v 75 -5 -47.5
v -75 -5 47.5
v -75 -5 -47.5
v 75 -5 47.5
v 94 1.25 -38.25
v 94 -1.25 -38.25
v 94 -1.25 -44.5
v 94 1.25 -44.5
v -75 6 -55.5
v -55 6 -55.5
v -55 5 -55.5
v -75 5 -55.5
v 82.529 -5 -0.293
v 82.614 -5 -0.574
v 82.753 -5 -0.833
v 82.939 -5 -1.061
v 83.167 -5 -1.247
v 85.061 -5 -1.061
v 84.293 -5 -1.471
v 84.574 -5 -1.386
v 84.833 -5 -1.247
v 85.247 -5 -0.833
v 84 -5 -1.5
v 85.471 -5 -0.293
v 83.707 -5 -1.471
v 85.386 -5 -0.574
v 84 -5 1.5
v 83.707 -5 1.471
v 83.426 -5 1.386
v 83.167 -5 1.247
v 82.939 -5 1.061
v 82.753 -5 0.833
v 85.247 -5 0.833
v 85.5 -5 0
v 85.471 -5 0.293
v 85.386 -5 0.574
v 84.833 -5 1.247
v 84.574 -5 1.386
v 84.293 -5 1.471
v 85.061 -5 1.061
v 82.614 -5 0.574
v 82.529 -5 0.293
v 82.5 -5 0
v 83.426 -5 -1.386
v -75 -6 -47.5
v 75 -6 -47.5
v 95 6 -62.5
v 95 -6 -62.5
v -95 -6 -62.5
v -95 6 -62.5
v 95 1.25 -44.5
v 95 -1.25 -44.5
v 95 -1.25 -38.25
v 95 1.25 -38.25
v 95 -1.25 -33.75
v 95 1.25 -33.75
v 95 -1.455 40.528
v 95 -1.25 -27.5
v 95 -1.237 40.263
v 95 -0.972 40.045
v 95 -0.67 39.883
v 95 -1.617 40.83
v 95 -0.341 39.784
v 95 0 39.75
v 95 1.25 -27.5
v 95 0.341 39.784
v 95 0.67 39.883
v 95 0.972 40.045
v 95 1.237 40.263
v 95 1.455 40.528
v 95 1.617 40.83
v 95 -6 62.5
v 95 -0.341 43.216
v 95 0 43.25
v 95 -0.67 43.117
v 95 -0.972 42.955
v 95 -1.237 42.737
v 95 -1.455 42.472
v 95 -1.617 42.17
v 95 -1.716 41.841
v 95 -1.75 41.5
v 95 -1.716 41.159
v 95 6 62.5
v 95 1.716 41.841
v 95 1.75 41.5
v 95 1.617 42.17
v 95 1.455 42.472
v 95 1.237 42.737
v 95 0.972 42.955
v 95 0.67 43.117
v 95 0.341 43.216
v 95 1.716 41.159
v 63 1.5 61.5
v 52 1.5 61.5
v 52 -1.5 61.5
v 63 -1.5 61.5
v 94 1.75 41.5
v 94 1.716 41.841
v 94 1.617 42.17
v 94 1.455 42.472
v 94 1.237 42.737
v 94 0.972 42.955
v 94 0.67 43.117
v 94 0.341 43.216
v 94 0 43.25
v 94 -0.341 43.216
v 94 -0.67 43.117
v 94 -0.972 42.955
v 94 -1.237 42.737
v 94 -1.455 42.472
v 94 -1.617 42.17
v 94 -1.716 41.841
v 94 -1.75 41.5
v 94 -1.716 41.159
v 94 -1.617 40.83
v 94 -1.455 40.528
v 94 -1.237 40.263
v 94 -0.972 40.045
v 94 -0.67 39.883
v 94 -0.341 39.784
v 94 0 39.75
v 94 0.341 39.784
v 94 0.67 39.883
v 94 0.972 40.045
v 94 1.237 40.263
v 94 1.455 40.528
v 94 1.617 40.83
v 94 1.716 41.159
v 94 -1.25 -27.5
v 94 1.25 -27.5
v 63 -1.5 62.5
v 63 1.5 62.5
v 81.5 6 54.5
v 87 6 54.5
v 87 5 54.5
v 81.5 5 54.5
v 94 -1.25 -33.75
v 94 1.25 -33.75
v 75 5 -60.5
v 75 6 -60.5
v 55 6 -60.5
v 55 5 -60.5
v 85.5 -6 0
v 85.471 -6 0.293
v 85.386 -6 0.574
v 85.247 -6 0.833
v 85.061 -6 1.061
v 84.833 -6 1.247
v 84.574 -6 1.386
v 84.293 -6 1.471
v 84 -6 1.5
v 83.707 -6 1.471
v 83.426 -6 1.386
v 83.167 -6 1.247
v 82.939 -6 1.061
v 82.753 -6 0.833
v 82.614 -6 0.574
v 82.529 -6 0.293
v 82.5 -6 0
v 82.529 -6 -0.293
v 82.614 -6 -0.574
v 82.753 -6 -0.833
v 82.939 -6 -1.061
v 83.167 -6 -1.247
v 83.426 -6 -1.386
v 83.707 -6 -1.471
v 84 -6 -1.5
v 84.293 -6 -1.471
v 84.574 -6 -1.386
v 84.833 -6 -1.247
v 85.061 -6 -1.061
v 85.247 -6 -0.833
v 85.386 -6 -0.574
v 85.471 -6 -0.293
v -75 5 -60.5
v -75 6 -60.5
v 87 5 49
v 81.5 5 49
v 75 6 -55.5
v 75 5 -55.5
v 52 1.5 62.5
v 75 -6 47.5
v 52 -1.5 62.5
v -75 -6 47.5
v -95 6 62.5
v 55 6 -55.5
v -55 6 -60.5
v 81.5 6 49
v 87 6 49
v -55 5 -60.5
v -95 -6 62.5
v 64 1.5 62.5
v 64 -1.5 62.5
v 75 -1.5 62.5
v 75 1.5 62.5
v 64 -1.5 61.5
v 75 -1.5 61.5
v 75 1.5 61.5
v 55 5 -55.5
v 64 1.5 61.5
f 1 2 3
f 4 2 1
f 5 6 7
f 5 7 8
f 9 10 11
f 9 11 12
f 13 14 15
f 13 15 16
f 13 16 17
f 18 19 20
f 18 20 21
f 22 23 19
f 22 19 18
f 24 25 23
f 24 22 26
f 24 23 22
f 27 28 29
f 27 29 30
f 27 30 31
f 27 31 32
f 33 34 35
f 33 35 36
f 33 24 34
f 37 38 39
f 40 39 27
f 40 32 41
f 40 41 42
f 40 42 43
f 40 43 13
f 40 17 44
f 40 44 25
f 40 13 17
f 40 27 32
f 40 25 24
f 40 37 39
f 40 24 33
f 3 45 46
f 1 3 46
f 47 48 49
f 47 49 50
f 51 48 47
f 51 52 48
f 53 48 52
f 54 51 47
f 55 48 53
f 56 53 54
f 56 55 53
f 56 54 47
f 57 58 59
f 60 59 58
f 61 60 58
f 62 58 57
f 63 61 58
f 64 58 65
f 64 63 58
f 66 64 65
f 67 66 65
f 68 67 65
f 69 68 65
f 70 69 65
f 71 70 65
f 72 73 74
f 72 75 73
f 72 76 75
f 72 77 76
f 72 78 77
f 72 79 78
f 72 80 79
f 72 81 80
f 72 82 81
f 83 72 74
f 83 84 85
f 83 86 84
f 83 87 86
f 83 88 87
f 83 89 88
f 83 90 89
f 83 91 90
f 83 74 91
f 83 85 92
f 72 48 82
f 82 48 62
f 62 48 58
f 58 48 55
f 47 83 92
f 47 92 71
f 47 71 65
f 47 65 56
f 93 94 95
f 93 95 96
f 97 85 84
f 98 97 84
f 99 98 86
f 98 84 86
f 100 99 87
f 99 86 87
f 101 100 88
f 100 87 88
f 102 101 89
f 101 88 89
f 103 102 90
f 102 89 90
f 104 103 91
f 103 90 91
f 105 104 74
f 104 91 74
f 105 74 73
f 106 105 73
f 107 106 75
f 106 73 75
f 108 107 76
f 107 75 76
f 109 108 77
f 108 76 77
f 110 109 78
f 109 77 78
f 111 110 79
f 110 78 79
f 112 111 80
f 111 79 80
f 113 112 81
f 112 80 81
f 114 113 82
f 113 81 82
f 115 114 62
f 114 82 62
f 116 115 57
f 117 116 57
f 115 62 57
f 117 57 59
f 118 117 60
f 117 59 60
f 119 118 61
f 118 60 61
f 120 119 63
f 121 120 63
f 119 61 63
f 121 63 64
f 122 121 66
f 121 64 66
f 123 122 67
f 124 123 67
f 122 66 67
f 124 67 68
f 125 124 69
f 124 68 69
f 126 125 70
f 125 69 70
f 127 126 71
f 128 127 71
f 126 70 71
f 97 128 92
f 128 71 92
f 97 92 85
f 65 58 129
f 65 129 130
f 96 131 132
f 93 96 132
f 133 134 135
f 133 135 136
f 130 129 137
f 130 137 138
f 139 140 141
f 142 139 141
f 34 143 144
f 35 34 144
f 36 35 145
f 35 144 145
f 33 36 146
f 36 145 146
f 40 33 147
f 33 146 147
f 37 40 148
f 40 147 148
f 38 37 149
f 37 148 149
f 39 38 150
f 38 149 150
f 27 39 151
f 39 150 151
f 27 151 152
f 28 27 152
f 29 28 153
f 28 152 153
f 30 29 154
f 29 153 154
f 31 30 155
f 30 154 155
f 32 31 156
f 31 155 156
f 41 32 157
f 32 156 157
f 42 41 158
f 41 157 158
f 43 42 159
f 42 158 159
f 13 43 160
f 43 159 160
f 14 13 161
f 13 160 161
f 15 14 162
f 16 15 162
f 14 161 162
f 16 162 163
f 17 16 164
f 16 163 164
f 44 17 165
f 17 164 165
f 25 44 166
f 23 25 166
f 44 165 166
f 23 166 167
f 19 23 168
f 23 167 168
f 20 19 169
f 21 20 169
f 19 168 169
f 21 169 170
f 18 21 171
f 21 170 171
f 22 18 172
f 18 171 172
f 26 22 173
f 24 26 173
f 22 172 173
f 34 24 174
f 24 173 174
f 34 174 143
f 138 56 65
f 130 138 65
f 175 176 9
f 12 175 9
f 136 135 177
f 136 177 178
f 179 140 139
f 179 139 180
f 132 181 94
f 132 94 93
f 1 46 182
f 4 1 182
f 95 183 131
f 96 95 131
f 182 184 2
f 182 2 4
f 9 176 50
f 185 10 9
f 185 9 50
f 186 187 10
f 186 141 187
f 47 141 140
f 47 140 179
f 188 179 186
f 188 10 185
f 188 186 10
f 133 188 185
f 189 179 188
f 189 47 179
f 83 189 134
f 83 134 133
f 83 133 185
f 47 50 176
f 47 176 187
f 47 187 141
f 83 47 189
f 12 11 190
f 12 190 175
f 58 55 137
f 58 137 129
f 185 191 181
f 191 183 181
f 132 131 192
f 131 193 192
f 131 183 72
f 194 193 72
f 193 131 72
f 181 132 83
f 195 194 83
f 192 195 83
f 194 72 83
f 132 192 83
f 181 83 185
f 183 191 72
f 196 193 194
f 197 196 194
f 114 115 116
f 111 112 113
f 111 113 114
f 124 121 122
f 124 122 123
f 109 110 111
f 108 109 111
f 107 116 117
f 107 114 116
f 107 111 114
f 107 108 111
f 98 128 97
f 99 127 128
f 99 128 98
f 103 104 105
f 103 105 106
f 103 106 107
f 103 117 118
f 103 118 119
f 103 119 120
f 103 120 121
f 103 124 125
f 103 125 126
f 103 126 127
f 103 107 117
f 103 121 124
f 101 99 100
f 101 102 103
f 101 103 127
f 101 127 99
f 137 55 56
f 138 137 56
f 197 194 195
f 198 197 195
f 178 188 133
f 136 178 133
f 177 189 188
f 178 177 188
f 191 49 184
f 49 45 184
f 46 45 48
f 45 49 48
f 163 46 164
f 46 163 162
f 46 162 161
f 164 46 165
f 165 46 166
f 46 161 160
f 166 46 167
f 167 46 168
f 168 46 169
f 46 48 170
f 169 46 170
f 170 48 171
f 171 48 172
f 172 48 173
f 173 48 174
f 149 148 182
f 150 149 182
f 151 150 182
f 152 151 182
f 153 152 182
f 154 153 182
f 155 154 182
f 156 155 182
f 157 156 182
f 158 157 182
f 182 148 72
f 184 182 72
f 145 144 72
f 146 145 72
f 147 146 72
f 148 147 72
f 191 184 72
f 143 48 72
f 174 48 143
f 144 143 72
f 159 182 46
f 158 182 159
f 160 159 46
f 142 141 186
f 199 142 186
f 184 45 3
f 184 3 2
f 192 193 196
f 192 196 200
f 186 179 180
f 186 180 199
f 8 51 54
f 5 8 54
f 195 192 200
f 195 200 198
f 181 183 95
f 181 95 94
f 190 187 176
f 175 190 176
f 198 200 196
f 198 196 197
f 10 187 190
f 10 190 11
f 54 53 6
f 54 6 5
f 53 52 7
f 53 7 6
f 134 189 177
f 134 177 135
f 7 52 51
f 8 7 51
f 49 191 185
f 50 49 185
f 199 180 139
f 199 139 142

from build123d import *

# Parameters (mm, degrees)
F0_W      = 15.5
F0_H      = 130
F1_DEPTH  = 100
F2_W      = 12
F2_H      = 125
F3_DEPTH  = 95
F4_W      = 20
F4_H      = 5
F4_W_2    = 5.5
F4_H_2    = 5.5
F5_DEPTH  = 1
F6_W      = 2.5
F6_H      = 6.25
F6_R      = 1.75
F7_DEPTH  = 1
F8_W      = 11
F8_H      = 3
F9_DEPTH  = 1
F10_W     = 150
F10_H     = 95
F10_R     = 1.5
F11_DEPTH = 1


with BuildPart() as f1:
    # F0 (on Right) → F1 (new body, symmetric)
    with BuildSketch(Plane.YZ):
        Rectangle(F0_W, F0_H)
    extrude(amount=F1_DEPTH, both=True)


with BuildPart() as f3:
    # F2 (on Right) → F3 (new body, symmetric)
    with BuildSketch(Plane.YZ):
        Rectangle(F2_W, F2_H)
    extrude(amount=F3_DEPTH, both=True)


with BuildPart() as f5_tool:
    # F4 (on face) → F5 (new body)
    with BuildSketch(Plane(origin=(0, 6, 0), x_dir=(-1, 0, 0), z_dir=(0, 1, 0))):
        with Locations((-65, -58)):
            Rectangle(F4_W, F4_H)
        with Locations((65, -58)):
            Rectangle(F4_W, F4_H)
        with Locations((-84.25, 51.75)):
            Rectangle(F4_W_2, F4_H_2)
    extrude(amount=-F5_DEPTH)


with BuildPart() as f1_1:
    add(f1.part)

    # F5: cut by f5_tool
    add(f5_tool.part, mode=Mode.SUBTRACT)


with BuildPart() as f3_1:
    add(f3.part)

    # F5: cut by f5_tool
    add(f5_tool.part, mode=Mode.SUBTRACT)


with BuildPart() as f7_tool:
    # F6 (on face) → F7 (new body)
    with BuildSketch(Plane.YZ.offset(95)):
        with Locations((0, -30.625)):
            Rectangle(F6_W, F6_H)
        with Locations((0, -41.375)):
            Rectangle(F6_W, F6_H)
        with Locations((0, 41.5)):
            Circle(F6_R)
    extrude(amount=-F7_DEPTH)


with BuildPart() as f1_2:
    add(f1_1.part)

    # F7: cut by f7_tool
    add(f7_tool.part, mode=Mode.SUBTRACT)


with BuildPart() as f3_2:
    add(f3_1.part)

    # F7: cut by f7_tool
    add(f7_tool.part, mode=Mode.SUBTRACT)


with BuildPart() as f9_tool:
    # F8 (on face) → F9 (new body)
    with BuildSketch(Plane.XY.offset(62.5)):
        with Locations((57.5, 0)):
            Rectangle(F8_W, F8_H)
        with Locations((69.5, 0)):
            Rectangle(F8_W, F8_H)
    extrude(amount=-F9_DEPTH)


with BuildPart() as f1_3:
    add(f1_2.part)

    # F9: cut by f9_tool
    add(f9_tool.part, mode=Mode.SUBTRACT)


with BuildPart() as f3_3:
    add(f3_2.part)

    # F9: cut by f9_tool
    add(f9_tool.part, mode=Mode.SUBTRACT)


with BuildPart() as f11_tool:
    # F10 (on face) → F11 (new body)
    with BuildSketch(Plane.XZ.offset(6)):
        Rectangle(F10_W, F10_H)
        with Locations((84, 0)):
            Circle(F10_R)
    extrude(amount=-F11_DEPTH)


with BuildPart() as f1_4:
    add(f1_3.part)

    # F11: cut by f11_tool
    add(f11_tool.part, mode=Mode.SUBTRACT)


with BuildPart() as f3_4:
    add(f3_3.part)

    # F11: cut by f11_tool
    add(f11_tool.part, mode=Mode.SUBTRACT)


solid = f3_4.part
